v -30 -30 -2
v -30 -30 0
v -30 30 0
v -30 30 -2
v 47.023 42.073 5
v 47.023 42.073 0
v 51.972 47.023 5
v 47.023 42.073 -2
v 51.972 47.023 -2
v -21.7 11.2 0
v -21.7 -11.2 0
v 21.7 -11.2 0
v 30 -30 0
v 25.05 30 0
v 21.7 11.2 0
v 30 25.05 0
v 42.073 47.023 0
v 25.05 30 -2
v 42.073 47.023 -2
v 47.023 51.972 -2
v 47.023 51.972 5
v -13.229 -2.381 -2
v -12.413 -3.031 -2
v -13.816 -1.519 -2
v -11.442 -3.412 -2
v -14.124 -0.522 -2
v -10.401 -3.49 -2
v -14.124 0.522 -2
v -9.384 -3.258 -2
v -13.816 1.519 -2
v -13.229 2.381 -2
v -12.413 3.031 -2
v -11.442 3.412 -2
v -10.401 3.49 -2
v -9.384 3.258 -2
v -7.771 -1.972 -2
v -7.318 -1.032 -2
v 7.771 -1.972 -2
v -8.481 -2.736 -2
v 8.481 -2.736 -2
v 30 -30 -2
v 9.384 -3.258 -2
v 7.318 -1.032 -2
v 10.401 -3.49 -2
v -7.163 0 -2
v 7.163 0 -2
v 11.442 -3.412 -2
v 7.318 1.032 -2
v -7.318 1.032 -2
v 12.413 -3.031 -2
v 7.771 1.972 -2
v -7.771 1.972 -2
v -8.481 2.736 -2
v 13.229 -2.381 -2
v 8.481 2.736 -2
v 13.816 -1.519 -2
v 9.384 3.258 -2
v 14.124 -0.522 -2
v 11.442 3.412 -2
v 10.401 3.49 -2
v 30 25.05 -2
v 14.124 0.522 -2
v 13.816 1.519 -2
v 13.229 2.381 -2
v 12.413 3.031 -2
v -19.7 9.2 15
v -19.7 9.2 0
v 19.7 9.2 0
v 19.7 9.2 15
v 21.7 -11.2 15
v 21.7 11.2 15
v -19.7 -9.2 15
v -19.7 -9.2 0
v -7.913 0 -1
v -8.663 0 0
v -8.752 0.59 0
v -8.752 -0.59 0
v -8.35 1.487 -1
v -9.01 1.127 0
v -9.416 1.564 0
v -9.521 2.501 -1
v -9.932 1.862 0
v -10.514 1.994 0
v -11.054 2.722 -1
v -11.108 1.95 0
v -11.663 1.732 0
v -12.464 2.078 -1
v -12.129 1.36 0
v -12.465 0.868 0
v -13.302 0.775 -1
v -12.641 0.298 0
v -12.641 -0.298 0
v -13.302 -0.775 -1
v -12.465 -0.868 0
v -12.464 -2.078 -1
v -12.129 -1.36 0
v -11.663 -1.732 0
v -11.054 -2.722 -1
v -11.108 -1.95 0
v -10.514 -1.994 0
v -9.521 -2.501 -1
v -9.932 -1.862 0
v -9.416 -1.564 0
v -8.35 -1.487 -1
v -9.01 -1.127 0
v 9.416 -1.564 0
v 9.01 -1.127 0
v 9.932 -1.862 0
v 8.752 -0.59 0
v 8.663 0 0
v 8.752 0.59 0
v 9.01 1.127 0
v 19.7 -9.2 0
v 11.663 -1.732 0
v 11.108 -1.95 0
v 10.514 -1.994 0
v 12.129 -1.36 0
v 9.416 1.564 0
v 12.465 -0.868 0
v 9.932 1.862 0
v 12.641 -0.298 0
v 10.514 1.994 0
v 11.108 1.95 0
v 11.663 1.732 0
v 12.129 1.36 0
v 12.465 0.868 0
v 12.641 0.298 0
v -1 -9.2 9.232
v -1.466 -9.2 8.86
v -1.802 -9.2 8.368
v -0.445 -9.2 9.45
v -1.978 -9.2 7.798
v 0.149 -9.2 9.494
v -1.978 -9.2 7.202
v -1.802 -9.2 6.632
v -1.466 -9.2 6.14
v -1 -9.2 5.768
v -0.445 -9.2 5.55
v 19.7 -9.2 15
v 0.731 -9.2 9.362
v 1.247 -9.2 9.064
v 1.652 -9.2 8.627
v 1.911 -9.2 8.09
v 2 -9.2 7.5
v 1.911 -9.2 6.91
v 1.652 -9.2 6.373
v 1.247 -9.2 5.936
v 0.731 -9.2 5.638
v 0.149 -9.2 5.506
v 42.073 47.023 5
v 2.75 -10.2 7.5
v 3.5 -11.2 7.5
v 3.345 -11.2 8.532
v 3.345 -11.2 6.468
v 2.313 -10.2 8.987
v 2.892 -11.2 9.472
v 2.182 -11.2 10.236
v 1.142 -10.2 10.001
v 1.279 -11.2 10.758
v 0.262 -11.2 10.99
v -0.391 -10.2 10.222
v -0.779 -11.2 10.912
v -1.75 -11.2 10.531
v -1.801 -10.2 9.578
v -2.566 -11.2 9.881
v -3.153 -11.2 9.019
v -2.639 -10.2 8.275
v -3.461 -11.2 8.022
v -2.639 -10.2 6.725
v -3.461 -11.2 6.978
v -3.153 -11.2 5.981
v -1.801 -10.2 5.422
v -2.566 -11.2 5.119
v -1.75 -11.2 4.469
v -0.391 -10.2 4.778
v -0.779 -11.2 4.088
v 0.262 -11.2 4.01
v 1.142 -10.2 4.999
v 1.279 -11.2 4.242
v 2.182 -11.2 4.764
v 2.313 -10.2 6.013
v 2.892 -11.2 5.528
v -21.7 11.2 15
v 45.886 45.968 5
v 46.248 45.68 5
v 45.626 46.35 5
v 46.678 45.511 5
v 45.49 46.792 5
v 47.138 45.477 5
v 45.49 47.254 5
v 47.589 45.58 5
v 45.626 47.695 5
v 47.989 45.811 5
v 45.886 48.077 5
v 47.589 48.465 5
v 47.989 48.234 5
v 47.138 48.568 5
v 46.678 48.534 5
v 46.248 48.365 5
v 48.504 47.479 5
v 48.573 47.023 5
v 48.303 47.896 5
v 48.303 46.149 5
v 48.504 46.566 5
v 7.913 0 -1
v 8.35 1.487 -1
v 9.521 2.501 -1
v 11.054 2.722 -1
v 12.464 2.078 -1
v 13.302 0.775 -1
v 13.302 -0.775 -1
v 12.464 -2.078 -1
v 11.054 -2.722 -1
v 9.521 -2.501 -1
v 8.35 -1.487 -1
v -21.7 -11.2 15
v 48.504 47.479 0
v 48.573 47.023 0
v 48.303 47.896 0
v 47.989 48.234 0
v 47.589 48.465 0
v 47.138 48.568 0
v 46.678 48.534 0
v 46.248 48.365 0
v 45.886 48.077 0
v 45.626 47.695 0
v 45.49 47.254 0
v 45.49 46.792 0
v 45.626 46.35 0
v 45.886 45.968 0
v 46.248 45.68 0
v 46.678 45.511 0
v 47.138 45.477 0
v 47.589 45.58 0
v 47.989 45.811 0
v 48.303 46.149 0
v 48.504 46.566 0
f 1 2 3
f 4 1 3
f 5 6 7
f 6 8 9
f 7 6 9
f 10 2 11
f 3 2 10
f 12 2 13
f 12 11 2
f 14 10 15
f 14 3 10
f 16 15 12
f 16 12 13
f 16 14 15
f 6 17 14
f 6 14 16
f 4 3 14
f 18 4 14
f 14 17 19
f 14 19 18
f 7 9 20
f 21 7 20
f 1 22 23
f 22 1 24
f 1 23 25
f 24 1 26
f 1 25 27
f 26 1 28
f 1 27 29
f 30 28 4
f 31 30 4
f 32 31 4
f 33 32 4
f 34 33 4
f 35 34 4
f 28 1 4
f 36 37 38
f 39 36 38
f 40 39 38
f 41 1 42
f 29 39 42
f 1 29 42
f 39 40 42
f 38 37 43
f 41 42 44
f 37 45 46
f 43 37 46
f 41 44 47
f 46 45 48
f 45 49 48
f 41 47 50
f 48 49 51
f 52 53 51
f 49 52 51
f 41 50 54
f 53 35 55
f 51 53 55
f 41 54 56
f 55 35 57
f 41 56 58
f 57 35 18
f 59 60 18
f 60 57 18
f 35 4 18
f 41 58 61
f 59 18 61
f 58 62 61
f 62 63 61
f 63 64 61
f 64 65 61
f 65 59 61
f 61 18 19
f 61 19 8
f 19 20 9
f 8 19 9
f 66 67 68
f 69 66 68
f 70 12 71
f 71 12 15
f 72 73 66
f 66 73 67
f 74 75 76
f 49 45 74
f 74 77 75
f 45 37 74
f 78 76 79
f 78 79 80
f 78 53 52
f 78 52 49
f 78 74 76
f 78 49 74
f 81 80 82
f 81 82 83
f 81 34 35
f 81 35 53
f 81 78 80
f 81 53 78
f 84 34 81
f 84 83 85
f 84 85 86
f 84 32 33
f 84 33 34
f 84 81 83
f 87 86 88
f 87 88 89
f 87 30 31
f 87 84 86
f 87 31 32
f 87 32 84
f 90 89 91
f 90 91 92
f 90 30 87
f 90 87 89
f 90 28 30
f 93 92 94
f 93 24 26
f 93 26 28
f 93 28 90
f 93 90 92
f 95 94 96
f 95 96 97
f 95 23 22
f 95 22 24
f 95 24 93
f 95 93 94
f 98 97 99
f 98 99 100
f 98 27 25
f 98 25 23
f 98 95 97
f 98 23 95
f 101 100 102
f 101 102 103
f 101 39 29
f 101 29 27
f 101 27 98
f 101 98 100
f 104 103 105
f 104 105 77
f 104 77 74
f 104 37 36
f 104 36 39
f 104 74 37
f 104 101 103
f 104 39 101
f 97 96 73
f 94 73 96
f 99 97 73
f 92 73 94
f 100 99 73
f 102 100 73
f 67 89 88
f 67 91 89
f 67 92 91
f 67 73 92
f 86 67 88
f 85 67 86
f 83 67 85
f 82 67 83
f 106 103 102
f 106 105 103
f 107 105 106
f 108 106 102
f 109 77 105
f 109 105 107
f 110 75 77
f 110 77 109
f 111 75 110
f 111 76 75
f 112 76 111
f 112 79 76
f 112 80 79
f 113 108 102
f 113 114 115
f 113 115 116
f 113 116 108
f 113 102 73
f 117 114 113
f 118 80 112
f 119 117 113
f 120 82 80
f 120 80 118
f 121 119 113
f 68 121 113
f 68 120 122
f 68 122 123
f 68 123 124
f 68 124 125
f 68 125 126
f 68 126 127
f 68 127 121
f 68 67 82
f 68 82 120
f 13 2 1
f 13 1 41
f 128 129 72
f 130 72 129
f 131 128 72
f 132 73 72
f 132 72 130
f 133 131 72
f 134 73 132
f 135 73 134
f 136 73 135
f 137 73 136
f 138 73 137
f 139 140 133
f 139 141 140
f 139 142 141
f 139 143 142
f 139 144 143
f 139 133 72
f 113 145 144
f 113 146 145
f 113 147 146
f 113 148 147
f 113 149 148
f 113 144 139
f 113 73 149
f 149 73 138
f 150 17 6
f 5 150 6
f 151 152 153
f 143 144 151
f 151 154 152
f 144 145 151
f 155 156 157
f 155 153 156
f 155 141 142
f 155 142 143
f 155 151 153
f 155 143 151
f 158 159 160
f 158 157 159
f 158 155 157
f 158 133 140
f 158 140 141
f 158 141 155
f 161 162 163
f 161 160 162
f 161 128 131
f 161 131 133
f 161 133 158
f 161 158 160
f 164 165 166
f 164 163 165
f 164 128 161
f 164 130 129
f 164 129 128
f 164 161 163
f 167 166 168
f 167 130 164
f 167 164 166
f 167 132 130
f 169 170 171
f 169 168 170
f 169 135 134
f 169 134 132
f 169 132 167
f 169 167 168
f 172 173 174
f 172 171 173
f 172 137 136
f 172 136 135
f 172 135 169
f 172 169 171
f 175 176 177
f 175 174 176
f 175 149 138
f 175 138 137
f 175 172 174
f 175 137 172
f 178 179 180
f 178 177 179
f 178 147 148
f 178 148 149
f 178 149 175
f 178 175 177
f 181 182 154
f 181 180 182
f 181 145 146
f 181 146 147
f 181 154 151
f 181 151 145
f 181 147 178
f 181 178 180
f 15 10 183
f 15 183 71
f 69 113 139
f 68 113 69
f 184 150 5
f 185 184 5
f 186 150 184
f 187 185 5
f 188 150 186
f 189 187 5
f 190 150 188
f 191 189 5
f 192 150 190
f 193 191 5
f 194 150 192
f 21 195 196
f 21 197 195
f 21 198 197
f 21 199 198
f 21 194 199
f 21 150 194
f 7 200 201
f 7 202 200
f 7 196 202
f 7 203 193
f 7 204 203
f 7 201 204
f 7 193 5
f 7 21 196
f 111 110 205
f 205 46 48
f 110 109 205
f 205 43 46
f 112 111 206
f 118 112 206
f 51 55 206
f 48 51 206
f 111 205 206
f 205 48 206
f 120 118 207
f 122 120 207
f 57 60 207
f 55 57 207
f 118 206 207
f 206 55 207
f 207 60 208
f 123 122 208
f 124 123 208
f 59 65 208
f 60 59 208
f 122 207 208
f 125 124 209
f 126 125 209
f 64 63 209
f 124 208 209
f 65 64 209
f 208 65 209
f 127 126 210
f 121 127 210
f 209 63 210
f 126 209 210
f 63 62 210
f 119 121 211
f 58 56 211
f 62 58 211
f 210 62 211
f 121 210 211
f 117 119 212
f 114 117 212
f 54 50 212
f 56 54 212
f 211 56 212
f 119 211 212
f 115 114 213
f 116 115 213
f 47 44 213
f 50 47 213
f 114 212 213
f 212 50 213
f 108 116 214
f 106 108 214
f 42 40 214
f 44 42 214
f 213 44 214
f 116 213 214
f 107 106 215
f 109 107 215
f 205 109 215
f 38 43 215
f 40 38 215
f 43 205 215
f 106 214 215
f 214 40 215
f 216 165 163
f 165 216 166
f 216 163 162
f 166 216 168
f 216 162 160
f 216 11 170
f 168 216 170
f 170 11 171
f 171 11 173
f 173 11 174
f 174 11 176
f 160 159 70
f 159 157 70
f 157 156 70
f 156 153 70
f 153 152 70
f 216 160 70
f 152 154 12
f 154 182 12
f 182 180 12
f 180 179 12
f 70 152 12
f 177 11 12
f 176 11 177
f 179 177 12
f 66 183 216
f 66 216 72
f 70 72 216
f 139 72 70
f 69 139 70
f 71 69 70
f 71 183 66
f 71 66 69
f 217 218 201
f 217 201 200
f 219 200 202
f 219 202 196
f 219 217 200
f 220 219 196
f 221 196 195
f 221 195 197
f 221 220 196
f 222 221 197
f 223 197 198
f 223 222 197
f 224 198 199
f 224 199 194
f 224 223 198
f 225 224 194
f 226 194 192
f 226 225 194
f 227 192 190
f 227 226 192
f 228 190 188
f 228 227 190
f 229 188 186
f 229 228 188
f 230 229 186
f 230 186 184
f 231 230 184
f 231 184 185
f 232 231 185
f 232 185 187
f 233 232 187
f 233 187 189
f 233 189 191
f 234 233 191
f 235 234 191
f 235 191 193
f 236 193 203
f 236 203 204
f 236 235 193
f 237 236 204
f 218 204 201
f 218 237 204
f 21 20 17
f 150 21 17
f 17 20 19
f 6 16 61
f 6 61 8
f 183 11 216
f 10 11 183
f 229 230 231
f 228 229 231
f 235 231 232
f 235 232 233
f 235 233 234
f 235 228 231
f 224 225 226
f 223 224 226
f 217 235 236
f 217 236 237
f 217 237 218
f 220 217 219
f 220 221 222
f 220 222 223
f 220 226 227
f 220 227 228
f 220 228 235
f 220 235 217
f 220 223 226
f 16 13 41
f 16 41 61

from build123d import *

# Parameters (mm, degrees)
F0_W      = 60
F0_H      = 60
F0_W_2    = 43.4
F0_H_2    = 22.4
F0_W_3    = 39.4
F0_H_3    = 18.4
F0_R      = 2
F1_DEPTH  = 2
F2_R      = 1.55
F3_DEPTH  = 2
F4_DEPTH  = 15
F5_R      = 3.5
F7_R      = 3.5
F8_R      = 2
F10_DEPTH = 5


# Not quite as in the source:
# - a pattern or mirror of a feature is missing from the dataset's text; its kind, count and spacing are read off the source's solid
# - a feature names something its author has since deleted; it is built from what else it names


with BuildPart() as f1:
    # F0 (on Top) → F1 (new body)
    with BuildSketch(Plane.XY):
        Rectangle(F0_W, F0_H)
        Rectangle(F0_W_2, F0_H_2, mode=Mode.SUBTRACT)
        Rectangle(F0_W_2, F0_H_2)
        Rectangle(F0_W_3, F0_H_3, mode=Mode.SUBTRACT)
        Rectangle(F0_W_3, F0_H_3)
        with Locations((-10.6629617512, 0)):
            Circle(F0_R, mode=Mode.SUBTRACT)
        with Locations((-10.6629617512, 0)):
            Circle(F0_R)
    extrude(amount=-F1_DEPTH)

    # F2 (on Top) → F3 (join)
    with BuildSketch(Plane.XY):
        Polygon((42.0728534806, 47.0226009489), (-2.4748737342, 2.4748737342), (2.4748737342, -2.4748737342), (47.0226009489, 42.0728534806), align=None)
        Polygon((47.0226009489, 51.9723484172), (42.0728534806, 47.0226009489), (47.0226009489, 42.0728534806), (51.9723484172, 47.0226009489), align=None)
        with Locations((47.0226009489, 47.0226009489)):
            Circle(F2_R, mode=Mode.SUBTRACT)
        with Locations((47.0226009489, 47.0226009489)):
            Circle(F2_R)
    extrude(amount=-F3_DEPTH)

    # F0 (on Top) → F4 (join)
    with BuildSketch(Plane.XY):
        Rectangle(F0_W_2, F0_H_2)
        Rectangle(F0_W_3, F0_H_3, mode=Mode.SUBTRACT)
    extrude(amount=F4_DEPTH)

    # F0 (on Top) → F6 section 0
    with BuildSketch(Plane.XY):
        with Locations((-10.6629617512, 0)):
            Circle(F0_R)
    # F5 (on face) → F6 section 1
    with BuildSketch(Plane(origin=(0, 0, -2), x_dir=(1, 0, 0), z_dir=(0, 0, -1))):
        with Locations((-10.6629617512, 0)):
            Circle(F5_R)
    f6 = loft(mode=Mode.SUBTRACT)

    # F6_copies: F6 across plane
    add(f6.mirror(Plane(origin=(0, 0, 0), x_dir=(0, 0, 1), z_dir=(1, 0, 0))), mode=Mode.SUBTRACT)

    # F7 (on face) → F9 section 0
    with BuildSketch(Plane.XZ.offset(11.2)):
        with Locations((0, 7.5)):
            Circle(F7_R)
    # F8 (on face) → F9 section 1
    with BuildSketch(Plane(origin=(0, -9.2, 0), x_dir=(-1, 0, 0), z_dir=(0, 1, 0))):
        with Locations((0, 7.5)):
            Circle(F8_R)
    loft(mode=Mode.SUBTRACT)

    # F2 (on Top) → F10 (join)
    with BuildSketch(Plane.XY):
        Polygon((47.0226009489, 51.9723484172), (42.0728534806, 47.0226009489), (47.0226009489, 42.0728534806), (51.9723484172, 47.0226009489), align=None)
        with Locations((47.0226009489, 47.0226009489)):
            Circle(F2_R, mode=Mode.SUBTRACT)
    extrude(amount=F10_DEPTH)


solid = f1.part
